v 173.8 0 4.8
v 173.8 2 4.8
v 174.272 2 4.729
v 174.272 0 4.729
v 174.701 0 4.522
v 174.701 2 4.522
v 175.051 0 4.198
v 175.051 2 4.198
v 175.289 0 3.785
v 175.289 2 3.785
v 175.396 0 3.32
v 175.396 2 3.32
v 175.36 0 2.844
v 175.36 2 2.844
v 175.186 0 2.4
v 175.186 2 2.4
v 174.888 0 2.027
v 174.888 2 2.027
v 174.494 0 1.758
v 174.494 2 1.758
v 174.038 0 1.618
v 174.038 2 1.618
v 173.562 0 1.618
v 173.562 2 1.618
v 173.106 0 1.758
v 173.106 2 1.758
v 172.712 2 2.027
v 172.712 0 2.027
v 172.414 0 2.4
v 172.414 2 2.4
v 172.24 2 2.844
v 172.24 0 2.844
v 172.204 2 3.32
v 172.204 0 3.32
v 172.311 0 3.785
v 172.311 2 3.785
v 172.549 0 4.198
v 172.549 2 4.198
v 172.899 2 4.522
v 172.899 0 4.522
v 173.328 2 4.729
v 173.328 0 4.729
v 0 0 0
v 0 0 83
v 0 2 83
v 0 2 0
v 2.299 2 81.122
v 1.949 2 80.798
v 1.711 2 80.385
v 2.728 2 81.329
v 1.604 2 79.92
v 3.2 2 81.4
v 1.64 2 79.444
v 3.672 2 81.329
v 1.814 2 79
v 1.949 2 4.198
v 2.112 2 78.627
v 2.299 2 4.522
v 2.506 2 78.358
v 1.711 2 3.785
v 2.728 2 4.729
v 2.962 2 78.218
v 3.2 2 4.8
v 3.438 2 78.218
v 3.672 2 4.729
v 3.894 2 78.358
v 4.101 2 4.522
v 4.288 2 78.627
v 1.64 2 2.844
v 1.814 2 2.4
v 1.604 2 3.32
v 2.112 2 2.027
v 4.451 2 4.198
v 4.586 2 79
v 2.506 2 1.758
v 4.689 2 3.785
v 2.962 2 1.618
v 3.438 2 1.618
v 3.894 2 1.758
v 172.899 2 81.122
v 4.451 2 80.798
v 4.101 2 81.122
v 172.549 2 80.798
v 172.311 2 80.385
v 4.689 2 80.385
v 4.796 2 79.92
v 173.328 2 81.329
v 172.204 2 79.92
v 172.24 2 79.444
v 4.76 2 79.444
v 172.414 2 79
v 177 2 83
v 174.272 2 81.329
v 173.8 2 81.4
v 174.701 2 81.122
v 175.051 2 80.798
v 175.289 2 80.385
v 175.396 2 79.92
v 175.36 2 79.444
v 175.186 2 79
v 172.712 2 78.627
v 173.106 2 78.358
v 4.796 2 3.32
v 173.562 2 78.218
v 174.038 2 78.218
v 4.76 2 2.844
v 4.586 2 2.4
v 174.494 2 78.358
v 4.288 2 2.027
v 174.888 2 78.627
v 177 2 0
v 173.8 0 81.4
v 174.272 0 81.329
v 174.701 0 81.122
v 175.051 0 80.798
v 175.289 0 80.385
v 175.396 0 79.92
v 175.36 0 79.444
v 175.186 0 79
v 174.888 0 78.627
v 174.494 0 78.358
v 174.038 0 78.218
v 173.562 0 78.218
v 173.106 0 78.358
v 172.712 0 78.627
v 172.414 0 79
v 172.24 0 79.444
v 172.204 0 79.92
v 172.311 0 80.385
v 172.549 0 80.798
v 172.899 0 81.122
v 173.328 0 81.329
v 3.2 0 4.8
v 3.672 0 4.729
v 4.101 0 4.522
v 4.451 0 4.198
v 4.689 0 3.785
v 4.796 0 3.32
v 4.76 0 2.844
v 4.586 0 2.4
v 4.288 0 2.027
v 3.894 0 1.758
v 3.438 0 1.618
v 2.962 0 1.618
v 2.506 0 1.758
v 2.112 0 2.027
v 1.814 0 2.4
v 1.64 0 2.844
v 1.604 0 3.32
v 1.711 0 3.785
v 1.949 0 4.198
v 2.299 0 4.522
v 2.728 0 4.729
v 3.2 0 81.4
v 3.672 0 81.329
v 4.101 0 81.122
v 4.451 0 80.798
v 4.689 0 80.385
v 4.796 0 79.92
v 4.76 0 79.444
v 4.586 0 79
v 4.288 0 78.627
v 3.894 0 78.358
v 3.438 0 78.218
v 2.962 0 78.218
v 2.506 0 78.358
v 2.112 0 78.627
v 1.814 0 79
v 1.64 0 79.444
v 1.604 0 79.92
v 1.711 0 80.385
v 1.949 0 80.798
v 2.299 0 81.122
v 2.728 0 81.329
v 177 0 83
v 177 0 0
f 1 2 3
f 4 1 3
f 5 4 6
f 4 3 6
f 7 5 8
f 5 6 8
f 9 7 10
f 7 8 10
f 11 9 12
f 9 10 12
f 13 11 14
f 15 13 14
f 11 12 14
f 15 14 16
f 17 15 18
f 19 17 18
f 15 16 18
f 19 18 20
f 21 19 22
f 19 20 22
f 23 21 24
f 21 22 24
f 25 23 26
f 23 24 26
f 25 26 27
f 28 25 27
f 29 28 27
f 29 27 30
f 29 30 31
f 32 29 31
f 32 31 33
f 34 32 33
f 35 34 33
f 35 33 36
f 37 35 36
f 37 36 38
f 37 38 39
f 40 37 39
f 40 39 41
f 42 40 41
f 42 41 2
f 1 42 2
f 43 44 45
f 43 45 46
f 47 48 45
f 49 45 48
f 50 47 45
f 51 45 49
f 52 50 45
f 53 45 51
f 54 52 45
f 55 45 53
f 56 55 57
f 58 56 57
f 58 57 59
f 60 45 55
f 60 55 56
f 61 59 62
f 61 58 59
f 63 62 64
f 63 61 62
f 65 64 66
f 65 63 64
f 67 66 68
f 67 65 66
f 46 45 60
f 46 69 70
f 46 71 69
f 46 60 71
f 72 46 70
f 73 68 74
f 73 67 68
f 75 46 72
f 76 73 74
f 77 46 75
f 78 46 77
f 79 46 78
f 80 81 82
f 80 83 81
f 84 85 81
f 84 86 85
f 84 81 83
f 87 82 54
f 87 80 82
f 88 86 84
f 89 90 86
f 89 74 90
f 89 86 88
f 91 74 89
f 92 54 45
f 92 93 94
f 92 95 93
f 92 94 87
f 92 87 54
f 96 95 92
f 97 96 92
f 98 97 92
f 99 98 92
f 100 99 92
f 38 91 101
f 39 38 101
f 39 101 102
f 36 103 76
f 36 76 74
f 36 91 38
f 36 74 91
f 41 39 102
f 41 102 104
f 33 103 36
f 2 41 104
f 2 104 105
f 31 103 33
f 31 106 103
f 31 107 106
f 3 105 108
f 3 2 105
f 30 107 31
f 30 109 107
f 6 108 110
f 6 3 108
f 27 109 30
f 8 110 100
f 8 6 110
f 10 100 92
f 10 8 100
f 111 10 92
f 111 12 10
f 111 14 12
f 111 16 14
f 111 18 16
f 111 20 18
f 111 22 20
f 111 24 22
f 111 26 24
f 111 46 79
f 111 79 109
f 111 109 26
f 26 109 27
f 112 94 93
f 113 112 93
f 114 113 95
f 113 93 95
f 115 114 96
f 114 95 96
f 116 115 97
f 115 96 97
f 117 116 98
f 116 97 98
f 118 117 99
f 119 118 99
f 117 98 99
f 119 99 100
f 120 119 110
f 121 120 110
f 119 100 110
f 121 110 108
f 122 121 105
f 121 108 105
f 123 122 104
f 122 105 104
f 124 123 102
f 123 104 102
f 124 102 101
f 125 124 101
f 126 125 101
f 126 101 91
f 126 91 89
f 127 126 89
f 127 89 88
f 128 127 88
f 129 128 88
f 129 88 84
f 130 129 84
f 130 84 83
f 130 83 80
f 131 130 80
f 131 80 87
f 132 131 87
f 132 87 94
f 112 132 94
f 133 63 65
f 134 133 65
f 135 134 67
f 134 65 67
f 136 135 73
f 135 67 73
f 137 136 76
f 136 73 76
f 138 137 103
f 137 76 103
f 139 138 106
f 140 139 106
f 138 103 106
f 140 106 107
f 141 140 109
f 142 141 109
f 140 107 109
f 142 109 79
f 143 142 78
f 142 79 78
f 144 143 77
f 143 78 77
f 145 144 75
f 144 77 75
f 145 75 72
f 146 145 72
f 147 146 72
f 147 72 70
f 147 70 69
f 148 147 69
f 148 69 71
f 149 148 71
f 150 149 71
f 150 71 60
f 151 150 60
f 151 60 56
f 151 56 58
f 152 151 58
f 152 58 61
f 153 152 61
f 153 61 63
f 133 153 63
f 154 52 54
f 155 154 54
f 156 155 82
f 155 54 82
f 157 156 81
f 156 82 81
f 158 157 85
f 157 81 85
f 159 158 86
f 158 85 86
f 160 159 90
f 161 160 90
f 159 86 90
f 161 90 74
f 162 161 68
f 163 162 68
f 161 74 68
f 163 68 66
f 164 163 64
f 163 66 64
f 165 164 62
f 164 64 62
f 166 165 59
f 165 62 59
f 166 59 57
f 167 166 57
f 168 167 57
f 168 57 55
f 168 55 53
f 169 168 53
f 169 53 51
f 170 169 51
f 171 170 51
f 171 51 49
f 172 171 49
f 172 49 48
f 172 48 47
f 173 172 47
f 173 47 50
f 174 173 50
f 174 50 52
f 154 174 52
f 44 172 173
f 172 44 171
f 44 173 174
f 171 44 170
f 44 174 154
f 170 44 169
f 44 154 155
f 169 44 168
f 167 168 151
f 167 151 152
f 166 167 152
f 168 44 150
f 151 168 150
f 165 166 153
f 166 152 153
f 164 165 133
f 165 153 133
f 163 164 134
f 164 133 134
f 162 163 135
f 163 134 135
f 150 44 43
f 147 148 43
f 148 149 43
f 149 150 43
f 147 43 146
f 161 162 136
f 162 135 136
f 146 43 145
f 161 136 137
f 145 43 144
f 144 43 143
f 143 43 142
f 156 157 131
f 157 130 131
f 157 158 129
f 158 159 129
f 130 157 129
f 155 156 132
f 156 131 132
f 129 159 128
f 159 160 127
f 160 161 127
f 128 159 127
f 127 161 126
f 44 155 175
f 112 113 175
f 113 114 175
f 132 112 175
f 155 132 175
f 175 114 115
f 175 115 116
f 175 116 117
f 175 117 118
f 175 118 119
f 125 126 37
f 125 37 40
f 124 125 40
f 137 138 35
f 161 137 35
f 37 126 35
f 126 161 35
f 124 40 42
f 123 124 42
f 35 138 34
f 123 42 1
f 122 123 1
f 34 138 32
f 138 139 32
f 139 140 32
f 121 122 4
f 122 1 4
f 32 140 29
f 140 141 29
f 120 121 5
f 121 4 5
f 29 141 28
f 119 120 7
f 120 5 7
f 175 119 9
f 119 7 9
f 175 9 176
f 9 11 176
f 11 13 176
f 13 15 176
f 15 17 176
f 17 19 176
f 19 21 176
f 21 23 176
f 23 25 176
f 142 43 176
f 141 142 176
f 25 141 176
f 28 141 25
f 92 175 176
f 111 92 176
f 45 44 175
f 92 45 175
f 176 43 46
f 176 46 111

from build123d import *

# Parameters (mm, degrees)
ESQUISSE1_W             = 177
ESQUISSE1_H             = 83
BOSS_EXTRU_1_DEPTH      = 2
ENL_V_MAT_EXTRU_1_REACH = 197.504
ESQUISSE2_R             = 1.6


with BuildPart() as part:
    # Esquisse1 → Boss.-Extru.1 (new body)
    with BuildSketch(Plane(origin=(0, 0, 0), x_dir=(1, 0, 0), z_dir=(0, 1, 0))):
        with Locations((88.5, -41.5)):
            Rectangle(ESQUISSE1_W, ESQUISSE1_H)
    extrude(amount=BOSS_EXTRU_1_DEPTH)

    # Esquisse2 → Enlèv. mat.-Extru.1 (cut, up to next)
    with BuildSketch(Plane(origin=(0, 2, 0), x_dir=(1, 0, 0), z_dir=(0, 1, 0)), mode=Mode.PRIVATE) as enl_v_mat_extru_1_sk1:
        with Locations(Location((3.2, -3.2, 0), (0, 0, 270))):
            Circle(ESQUISSE2_R)
    enl_v_mat_extru_1_tool1 = extrude(enl_v_mat_extru_1_sk1.sketch, amount=-ENL_V_MAT_EXTRU_1_REACH, mode=Mode.PRIVATE) & part.part
    # Esquisse2 → Enlèv. mat.-Extru.1 (cut, up to next)
    with BuildSketch(Plane(origin=(0, 2, 0), x_dir=(1, 0, 0), z_dir=(0, 1, 0)), mode=Mode.PRIVATE) as enl_v_mat_extru_1_sk2:
        with Locations(Location((3.2, -79.8, 0), (0, 0, 270))):
            Circle(ESQUISSE2_R)
    enl_v_mat_extru_1_tool2 = extrude(enl_v_mat_extru_1_sk2.sketch, amount=-ENL_V_MAT_EXTRU_1_REACH, mode=Mode.PRIVATE) & part.part
    # Esquisse2 → Enlèv. mat.-Extru.1 (cut, up to next)
    with BuildSketch(Plane(origin=(0, 2, 0), x_dir=(1, 0, 0), z_dir=(0, 1, 0)), mode=Mode.PRIVATE) as enl_v_mat_extru_1_sk3:
        with Locations(Location((173.8, -3.2, 0), (0, 0, 270))):
            Circle(ESQUISSE2_R)
    enl_v_mat_extru_1_tool3 = extrude(enl_v_mat_extru_1_sk3.sketch, amount=-ENL_V_MAT_EXTRU_1_REACH, mode=Mode.PRIVATE) & part.part
    # Esquisse2 → Enlèv. mat.-Extru.1 (cut, up to next)
    with BuildSketch(Plane(origin=(0, 2, 0), x_dir=(1, 0, 0), z_dir=(0, 1, 0)), mode=Mode.PRIVATE) as enl_v_mat_extru_1_sk4:
        with Locations(Location((173.8, -79.8, 0), (0, 0, 270))):
            Circle(ESQUISSE2_R)
    enl_v_mat_extru_1_tool4 = extrude(enl_v_mat_extru_1_sk4.sketch, amount=-ENL_V_MAT_EXTRU_1_REACH, mode=Mode.PRIVATE) & part.part
    add(enl_v_mat_extru_1_tool1.solids().sort_by_distance((3.2, 2, 3.2))[0], mode=Mode.SUBTRACT)
    add(enl_v_mat_extru_1_tool2.solids().sort_by_distance((3.2, 2, 79.8))[0], mode=Mode.SUBTRACT)
    add(enl_v_mat_extru_1_tool3.solids().sort_by_distance((173.8, 2, 3.2))[0], mode=Mode.SUBTRACT)
    add(enl_v_mat_extru_1_tool4.solids().sort_by_distance((173.8, 2, 79.8))[0], mode=Mode.SUBTRACT)


solid = part.part
